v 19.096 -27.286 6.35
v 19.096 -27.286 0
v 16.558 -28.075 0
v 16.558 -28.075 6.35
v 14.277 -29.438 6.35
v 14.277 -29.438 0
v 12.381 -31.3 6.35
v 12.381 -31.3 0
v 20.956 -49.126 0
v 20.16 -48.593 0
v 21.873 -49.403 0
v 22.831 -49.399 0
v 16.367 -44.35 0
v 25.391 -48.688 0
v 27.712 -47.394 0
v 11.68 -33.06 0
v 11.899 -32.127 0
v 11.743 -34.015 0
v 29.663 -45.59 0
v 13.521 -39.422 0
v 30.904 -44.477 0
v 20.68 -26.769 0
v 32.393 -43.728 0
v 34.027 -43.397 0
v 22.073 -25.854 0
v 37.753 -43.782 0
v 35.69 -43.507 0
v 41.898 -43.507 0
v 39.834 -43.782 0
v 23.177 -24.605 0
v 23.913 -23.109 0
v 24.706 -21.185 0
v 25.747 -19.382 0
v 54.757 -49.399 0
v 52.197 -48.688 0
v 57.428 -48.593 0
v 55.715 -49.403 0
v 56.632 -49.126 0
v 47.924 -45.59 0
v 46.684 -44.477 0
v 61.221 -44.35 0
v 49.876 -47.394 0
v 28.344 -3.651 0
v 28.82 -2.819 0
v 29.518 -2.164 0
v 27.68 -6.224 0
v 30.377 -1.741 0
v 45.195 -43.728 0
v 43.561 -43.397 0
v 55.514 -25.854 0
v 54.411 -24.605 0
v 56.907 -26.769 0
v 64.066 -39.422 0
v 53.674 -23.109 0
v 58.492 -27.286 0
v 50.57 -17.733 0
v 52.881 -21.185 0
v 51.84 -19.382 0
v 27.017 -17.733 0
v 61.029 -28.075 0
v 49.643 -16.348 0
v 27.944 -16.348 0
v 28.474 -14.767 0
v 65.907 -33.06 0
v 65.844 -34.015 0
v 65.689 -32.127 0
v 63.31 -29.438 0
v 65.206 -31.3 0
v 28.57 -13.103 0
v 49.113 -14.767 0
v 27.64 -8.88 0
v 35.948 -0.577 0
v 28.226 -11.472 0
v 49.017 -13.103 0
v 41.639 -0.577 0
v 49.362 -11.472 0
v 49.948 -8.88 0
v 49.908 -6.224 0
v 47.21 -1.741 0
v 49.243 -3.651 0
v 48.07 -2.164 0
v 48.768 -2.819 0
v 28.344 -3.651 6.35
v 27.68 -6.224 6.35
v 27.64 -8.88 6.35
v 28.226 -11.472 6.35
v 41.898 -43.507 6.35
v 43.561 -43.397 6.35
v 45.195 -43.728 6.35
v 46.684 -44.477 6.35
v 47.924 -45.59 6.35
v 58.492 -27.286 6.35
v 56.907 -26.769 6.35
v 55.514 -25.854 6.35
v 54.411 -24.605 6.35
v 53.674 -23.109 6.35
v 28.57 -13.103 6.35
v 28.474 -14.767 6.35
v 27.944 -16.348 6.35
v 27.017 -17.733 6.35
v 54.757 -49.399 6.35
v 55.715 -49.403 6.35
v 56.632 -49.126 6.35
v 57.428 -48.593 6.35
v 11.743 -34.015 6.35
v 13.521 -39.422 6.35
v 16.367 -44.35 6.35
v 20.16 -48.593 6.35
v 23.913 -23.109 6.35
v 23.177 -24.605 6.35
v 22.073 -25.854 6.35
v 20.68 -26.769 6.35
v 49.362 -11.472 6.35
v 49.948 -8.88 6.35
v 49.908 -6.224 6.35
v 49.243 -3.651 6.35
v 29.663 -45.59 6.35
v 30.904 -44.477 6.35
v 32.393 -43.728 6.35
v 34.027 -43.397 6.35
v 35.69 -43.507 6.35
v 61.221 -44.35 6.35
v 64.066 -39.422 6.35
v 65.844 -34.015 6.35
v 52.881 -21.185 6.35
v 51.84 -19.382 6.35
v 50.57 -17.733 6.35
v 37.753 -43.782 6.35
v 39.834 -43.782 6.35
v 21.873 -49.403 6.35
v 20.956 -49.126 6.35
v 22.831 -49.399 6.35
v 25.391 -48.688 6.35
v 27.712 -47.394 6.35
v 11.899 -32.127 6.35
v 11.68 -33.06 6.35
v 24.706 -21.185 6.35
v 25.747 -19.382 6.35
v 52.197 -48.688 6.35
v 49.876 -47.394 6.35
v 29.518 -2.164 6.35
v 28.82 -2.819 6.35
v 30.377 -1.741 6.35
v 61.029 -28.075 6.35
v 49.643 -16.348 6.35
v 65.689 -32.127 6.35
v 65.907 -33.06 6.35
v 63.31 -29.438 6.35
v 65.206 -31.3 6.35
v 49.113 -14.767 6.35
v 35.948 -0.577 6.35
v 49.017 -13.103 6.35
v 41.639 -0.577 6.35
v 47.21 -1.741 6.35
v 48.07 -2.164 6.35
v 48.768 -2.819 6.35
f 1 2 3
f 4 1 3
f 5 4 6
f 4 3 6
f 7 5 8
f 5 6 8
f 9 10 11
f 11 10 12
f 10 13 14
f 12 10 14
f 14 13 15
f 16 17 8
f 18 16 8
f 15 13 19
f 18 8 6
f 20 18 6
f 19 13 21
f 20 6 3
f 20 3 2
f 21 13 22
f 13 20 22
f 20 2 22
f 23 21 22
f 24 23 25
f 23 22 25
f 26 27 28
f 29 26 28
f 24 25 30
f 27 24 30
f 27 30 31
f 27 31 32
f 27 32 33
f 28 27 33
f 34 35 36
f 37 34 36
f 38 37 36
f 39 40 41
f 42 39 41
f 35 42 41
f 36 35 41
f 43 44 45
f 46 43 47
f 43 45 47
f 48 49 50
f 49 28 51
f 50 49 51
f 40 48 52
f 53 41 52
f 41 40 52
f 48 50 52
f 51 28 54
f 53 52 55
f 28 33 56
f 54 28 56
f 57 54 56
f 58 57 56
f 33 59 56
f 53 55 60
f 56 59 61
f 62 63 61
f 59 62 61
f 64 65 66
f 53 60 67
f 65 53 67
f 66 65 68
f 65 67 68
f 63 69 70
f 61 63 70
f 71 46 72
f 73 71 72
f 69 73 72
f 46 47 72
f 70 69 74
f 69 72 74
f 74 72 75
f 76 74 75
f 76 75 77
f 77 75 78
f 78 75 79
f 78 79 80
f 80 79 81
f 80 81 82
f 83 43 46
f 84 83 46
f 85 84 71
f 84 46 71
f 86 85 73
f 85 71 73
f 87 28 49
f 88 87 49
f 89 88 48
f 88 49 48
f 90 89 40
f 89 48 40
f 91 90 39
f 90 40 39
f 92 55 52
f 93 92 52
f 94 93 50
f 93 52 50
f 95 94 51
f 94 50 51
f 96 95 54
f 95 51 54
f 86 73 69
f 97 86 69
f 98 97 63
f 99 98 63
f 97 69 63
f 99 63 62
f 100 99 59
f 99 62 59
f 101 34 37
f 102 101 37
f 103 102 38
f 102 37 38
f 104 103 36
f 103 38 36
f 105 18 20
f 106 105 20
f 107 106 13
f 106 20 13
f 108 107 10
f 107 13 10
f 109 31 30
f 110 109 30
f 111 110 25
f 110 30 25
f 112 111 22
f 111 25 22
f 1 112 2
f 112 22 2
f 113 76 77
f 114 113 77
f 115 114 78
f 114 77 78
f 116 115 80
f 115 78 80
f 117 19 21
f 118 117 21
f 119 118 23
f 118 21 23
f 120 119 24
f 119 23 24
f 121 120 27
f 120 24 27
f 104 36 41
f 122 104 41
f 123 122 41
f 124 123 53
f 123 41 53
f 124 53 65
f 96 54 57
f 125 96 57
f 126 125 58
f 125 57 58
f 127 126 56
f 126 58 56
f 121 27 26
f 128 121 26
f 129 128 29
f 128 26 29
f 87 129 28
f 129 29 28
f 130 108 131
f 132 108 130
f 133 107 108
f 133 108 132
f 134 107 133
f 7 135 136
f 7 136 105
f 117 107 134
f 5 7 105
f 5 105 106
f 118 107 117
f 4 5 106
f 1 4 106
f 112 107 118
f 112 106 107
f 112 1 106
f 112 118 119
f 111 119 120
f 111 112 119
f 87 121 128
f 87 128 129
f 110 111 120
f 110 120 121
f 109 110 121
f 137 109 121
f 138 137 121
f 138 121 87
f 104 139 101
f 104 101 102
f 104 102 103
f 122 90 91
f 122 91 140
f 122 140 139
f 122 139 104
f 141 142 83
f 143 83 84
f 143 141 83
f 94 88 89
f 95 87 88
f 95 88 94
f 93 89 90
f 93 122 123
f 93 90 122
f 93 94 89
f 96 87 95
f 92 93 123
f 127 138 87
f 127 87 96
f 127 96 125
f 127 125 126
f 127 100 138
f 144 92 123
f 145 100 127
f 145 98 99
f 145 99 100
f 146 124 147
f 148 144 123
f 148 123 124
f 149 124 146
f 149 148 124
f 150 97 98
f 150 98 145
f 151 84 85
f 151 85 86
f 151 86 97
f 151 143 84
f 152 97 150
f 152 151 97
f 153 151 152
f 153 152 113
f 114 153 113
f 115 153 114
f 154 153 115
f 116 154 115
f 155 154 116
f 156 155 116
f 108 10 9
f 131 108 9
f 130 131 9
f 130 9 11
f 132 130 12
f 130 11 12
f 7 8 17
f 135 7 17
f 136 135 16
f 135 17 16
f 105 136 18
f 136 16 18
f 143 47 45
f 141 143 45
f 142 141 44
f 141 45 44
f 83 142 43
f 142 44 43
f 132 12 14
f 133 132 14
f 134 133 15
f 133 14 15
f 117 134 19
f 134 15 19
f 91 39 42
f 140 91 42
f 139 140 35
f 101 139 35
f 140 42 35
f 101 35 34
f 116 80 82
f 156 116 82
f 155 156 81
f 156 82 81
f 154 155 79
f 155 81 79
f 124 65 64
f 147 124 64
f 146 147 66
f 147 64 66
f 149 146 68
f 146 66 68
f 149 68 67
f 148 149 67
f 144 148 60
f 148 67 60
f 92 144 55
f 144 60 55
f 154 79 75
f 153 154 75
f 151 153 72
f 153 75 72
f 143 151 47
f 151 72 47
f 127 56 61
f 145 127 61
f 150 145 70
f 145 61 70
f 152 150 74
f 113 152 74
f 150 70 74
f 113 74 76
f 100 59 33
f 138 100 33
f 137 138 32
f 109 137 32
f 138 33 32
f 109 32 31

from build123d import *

# Parameters (mm, degrees)
BOSS_EXTRUDE1_DEPTH = 6.35


with BuildPart() as part:
    # Sketch1 → Boss-Extrude1 (new body)
    with BuildSketch(Plane.XY):
        with BuildLine():
            ThreePointArc((19.09558361, -27.286492755), (15.377016657, -28.688589019), (12.38097626, -31.299595732))
            ThreePointArc((12.38097626, -31.299595732), (11.754813891, -32.585358585), (11.743487691, -34.015441499))
            ThreePointArc((11.743487691, -34.015441499), (14.816954296, -41.959391499), (20.1598835, -48.593066656))
            ThreePointArc((20.1598835, -48.593066656), (21.404034733, -49.298299337), (22.830619211, -49.398908245))
            ThreePointArc((22.830619211, -49.398908245), (26.589837552, -48.109764507), (29.663372012, -45.590439192))
            ThreePointArc((29.663372012, -45.590439192), (32.39282557, -43.727845578), (35.689842925, -43.506829177))
            ThreePointArc((35.689842925, -43.506829177), (38.793733625, -43.816700713), (41.897624325, -43.506829177))
            ThreePointArc((41.897624325, -43.506829177), (45.194641681, -43.727845578), (47.924095238, -45.590439192))
            ThreePointArc((47.924095238, -45.590439192), (50.997629698, -48.109764507), (54.75684804, -49.398908245))
            ThreePointArc((54.75684804, -49.398908245), (56.183432518, -49.298299337), (57.427583751, -48.593066656))
            ThreePointArc((57.427583751, -48.593066656), (62.770512955, -41.959391499), (65.84397956, -34.015441499))
            ThreePointArc((65.84397956, -34.015441499), (65.83265336, -32.585358585), (65.206490991, -31.299595732))
            ThreePointArc((65.206490991, -31.299595732), (62.210450594, -28.688589019), (58.491883641, -27.286492755))
            ThreePointArc((58.491883641, -27.286492755), (55.514103476, -25.854013443), (53.67418898, -23.109220856))
            ThreePointArc((53.67418898, -23.109220856), (52.390600252, -20.266236892), (50.57029828, -17.733124463))
            ThreePointArc((50.57029828, -17.733124463), (49.11319542, -14.767315476), (49.361522028, -11.47224255))
            ThreePointArc((49.361522028, -11.47224255), (50.006554521, -7.550820971), (49.243376577, -3.650670519))
            ThreePointArc((49.243376577, -3.650670519), (48.442954467, -2.465516575), (47.210129434, -1.740666341))
            ThreePointArc((47.210129434, -1.740666341), (38.793733625, -0.430391499), (30.377337817, -1.740666341))
            ThreePointArc((30.377337817, -1.740666341), (29.144512783, -2.465516575), (28.344090674, -3.650670519))
            ThreePointArc((28.344090674, -3.650670519), (27.58091273, -7.550820971), (28.225945223, -11.47224255))
            ThreePointArc((28.225945223, -11.47224255), (28.47427183, -14.767315476), (27.01716897, -17.733124463))
            ThreePointArc((27.01716897, -17.733124463), (25.196866999, -20.266236892), (23.91327827, -23.109220856))
            ThreePointArc((23.91327827, -23.109220856), (22.073363775, -25.854013443), (19.09558361, -27.286492755))
        make_face()
    extrude(amount=BOSS_EXTRUDE1_DEPTH)


solid = part.part
